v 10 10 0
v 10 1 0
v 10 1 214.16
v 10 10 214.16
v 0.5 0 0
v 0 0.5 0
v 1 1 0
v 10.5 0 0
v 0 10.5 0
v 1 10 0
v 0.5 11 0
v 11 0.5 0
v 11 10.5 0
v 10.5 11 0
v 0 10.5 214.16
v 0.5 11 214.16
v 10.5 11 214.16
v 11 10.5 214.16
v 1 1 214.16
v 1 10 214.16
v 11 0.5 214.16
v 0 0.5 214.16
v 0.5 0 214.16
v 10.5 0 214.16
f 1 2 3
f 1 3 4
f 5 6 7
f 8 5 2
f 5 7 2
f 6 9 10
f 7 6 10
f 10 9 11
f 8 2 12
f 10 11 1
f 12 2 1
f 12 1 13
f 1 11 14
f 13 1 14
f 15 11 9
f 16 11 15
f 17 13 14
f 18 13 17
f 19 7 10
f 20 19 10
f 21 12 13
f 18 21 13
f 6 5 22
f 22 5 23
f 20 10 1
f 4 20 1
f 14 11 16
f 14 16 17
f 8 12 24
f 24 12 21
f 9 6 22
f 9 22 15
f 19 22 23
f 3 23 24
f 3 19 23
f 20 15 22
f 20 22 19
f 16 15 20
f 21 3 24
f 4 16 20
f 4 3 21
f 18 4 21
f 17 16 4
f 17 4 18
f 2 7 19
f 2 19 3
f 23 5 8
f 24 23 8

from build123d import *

# Parameters (mm, degrees)
SCHIZZO1_W          = 11
SCHIZZO1_H          = 11
SCHIZZO1_W_2        = 9
SCHIZZO1_H_2        = 9
EXTRUDE_THIN1_DEPTH = 214.16
CHAMFER1_SIZE       = 0.5


with BuildPart() as part:
    # Schizzo1 → Extrude-Thin1 (new body)
    with BuildSketch(Plane.XY):
        with Locations((5.5, 5.5)):
            Rectangle(SCHIZZO1_W, SCHIZZO1_H)
        with Locations((5.5, 5.5)):
            Rectangle(SCHIZZO1_W_2, SCHIZZO1_H_2, mode=Mode.SUBTRACT)
    extrude(amount=EXTRUDE_THIN1_DEPTH)

    # Chamfer1
    chamfer1_edges = [part.edges().sort_by_distance(p)[0] for p in [
        (11, 11, 107.08),
        (0, 11, 107.08),
        (0, 0, 107.08),
        (11, 0, 107.08),
    ]]
    chamfer(chamfer1_edges, length=CHAMFER1_SIZE)


solid = part.part
